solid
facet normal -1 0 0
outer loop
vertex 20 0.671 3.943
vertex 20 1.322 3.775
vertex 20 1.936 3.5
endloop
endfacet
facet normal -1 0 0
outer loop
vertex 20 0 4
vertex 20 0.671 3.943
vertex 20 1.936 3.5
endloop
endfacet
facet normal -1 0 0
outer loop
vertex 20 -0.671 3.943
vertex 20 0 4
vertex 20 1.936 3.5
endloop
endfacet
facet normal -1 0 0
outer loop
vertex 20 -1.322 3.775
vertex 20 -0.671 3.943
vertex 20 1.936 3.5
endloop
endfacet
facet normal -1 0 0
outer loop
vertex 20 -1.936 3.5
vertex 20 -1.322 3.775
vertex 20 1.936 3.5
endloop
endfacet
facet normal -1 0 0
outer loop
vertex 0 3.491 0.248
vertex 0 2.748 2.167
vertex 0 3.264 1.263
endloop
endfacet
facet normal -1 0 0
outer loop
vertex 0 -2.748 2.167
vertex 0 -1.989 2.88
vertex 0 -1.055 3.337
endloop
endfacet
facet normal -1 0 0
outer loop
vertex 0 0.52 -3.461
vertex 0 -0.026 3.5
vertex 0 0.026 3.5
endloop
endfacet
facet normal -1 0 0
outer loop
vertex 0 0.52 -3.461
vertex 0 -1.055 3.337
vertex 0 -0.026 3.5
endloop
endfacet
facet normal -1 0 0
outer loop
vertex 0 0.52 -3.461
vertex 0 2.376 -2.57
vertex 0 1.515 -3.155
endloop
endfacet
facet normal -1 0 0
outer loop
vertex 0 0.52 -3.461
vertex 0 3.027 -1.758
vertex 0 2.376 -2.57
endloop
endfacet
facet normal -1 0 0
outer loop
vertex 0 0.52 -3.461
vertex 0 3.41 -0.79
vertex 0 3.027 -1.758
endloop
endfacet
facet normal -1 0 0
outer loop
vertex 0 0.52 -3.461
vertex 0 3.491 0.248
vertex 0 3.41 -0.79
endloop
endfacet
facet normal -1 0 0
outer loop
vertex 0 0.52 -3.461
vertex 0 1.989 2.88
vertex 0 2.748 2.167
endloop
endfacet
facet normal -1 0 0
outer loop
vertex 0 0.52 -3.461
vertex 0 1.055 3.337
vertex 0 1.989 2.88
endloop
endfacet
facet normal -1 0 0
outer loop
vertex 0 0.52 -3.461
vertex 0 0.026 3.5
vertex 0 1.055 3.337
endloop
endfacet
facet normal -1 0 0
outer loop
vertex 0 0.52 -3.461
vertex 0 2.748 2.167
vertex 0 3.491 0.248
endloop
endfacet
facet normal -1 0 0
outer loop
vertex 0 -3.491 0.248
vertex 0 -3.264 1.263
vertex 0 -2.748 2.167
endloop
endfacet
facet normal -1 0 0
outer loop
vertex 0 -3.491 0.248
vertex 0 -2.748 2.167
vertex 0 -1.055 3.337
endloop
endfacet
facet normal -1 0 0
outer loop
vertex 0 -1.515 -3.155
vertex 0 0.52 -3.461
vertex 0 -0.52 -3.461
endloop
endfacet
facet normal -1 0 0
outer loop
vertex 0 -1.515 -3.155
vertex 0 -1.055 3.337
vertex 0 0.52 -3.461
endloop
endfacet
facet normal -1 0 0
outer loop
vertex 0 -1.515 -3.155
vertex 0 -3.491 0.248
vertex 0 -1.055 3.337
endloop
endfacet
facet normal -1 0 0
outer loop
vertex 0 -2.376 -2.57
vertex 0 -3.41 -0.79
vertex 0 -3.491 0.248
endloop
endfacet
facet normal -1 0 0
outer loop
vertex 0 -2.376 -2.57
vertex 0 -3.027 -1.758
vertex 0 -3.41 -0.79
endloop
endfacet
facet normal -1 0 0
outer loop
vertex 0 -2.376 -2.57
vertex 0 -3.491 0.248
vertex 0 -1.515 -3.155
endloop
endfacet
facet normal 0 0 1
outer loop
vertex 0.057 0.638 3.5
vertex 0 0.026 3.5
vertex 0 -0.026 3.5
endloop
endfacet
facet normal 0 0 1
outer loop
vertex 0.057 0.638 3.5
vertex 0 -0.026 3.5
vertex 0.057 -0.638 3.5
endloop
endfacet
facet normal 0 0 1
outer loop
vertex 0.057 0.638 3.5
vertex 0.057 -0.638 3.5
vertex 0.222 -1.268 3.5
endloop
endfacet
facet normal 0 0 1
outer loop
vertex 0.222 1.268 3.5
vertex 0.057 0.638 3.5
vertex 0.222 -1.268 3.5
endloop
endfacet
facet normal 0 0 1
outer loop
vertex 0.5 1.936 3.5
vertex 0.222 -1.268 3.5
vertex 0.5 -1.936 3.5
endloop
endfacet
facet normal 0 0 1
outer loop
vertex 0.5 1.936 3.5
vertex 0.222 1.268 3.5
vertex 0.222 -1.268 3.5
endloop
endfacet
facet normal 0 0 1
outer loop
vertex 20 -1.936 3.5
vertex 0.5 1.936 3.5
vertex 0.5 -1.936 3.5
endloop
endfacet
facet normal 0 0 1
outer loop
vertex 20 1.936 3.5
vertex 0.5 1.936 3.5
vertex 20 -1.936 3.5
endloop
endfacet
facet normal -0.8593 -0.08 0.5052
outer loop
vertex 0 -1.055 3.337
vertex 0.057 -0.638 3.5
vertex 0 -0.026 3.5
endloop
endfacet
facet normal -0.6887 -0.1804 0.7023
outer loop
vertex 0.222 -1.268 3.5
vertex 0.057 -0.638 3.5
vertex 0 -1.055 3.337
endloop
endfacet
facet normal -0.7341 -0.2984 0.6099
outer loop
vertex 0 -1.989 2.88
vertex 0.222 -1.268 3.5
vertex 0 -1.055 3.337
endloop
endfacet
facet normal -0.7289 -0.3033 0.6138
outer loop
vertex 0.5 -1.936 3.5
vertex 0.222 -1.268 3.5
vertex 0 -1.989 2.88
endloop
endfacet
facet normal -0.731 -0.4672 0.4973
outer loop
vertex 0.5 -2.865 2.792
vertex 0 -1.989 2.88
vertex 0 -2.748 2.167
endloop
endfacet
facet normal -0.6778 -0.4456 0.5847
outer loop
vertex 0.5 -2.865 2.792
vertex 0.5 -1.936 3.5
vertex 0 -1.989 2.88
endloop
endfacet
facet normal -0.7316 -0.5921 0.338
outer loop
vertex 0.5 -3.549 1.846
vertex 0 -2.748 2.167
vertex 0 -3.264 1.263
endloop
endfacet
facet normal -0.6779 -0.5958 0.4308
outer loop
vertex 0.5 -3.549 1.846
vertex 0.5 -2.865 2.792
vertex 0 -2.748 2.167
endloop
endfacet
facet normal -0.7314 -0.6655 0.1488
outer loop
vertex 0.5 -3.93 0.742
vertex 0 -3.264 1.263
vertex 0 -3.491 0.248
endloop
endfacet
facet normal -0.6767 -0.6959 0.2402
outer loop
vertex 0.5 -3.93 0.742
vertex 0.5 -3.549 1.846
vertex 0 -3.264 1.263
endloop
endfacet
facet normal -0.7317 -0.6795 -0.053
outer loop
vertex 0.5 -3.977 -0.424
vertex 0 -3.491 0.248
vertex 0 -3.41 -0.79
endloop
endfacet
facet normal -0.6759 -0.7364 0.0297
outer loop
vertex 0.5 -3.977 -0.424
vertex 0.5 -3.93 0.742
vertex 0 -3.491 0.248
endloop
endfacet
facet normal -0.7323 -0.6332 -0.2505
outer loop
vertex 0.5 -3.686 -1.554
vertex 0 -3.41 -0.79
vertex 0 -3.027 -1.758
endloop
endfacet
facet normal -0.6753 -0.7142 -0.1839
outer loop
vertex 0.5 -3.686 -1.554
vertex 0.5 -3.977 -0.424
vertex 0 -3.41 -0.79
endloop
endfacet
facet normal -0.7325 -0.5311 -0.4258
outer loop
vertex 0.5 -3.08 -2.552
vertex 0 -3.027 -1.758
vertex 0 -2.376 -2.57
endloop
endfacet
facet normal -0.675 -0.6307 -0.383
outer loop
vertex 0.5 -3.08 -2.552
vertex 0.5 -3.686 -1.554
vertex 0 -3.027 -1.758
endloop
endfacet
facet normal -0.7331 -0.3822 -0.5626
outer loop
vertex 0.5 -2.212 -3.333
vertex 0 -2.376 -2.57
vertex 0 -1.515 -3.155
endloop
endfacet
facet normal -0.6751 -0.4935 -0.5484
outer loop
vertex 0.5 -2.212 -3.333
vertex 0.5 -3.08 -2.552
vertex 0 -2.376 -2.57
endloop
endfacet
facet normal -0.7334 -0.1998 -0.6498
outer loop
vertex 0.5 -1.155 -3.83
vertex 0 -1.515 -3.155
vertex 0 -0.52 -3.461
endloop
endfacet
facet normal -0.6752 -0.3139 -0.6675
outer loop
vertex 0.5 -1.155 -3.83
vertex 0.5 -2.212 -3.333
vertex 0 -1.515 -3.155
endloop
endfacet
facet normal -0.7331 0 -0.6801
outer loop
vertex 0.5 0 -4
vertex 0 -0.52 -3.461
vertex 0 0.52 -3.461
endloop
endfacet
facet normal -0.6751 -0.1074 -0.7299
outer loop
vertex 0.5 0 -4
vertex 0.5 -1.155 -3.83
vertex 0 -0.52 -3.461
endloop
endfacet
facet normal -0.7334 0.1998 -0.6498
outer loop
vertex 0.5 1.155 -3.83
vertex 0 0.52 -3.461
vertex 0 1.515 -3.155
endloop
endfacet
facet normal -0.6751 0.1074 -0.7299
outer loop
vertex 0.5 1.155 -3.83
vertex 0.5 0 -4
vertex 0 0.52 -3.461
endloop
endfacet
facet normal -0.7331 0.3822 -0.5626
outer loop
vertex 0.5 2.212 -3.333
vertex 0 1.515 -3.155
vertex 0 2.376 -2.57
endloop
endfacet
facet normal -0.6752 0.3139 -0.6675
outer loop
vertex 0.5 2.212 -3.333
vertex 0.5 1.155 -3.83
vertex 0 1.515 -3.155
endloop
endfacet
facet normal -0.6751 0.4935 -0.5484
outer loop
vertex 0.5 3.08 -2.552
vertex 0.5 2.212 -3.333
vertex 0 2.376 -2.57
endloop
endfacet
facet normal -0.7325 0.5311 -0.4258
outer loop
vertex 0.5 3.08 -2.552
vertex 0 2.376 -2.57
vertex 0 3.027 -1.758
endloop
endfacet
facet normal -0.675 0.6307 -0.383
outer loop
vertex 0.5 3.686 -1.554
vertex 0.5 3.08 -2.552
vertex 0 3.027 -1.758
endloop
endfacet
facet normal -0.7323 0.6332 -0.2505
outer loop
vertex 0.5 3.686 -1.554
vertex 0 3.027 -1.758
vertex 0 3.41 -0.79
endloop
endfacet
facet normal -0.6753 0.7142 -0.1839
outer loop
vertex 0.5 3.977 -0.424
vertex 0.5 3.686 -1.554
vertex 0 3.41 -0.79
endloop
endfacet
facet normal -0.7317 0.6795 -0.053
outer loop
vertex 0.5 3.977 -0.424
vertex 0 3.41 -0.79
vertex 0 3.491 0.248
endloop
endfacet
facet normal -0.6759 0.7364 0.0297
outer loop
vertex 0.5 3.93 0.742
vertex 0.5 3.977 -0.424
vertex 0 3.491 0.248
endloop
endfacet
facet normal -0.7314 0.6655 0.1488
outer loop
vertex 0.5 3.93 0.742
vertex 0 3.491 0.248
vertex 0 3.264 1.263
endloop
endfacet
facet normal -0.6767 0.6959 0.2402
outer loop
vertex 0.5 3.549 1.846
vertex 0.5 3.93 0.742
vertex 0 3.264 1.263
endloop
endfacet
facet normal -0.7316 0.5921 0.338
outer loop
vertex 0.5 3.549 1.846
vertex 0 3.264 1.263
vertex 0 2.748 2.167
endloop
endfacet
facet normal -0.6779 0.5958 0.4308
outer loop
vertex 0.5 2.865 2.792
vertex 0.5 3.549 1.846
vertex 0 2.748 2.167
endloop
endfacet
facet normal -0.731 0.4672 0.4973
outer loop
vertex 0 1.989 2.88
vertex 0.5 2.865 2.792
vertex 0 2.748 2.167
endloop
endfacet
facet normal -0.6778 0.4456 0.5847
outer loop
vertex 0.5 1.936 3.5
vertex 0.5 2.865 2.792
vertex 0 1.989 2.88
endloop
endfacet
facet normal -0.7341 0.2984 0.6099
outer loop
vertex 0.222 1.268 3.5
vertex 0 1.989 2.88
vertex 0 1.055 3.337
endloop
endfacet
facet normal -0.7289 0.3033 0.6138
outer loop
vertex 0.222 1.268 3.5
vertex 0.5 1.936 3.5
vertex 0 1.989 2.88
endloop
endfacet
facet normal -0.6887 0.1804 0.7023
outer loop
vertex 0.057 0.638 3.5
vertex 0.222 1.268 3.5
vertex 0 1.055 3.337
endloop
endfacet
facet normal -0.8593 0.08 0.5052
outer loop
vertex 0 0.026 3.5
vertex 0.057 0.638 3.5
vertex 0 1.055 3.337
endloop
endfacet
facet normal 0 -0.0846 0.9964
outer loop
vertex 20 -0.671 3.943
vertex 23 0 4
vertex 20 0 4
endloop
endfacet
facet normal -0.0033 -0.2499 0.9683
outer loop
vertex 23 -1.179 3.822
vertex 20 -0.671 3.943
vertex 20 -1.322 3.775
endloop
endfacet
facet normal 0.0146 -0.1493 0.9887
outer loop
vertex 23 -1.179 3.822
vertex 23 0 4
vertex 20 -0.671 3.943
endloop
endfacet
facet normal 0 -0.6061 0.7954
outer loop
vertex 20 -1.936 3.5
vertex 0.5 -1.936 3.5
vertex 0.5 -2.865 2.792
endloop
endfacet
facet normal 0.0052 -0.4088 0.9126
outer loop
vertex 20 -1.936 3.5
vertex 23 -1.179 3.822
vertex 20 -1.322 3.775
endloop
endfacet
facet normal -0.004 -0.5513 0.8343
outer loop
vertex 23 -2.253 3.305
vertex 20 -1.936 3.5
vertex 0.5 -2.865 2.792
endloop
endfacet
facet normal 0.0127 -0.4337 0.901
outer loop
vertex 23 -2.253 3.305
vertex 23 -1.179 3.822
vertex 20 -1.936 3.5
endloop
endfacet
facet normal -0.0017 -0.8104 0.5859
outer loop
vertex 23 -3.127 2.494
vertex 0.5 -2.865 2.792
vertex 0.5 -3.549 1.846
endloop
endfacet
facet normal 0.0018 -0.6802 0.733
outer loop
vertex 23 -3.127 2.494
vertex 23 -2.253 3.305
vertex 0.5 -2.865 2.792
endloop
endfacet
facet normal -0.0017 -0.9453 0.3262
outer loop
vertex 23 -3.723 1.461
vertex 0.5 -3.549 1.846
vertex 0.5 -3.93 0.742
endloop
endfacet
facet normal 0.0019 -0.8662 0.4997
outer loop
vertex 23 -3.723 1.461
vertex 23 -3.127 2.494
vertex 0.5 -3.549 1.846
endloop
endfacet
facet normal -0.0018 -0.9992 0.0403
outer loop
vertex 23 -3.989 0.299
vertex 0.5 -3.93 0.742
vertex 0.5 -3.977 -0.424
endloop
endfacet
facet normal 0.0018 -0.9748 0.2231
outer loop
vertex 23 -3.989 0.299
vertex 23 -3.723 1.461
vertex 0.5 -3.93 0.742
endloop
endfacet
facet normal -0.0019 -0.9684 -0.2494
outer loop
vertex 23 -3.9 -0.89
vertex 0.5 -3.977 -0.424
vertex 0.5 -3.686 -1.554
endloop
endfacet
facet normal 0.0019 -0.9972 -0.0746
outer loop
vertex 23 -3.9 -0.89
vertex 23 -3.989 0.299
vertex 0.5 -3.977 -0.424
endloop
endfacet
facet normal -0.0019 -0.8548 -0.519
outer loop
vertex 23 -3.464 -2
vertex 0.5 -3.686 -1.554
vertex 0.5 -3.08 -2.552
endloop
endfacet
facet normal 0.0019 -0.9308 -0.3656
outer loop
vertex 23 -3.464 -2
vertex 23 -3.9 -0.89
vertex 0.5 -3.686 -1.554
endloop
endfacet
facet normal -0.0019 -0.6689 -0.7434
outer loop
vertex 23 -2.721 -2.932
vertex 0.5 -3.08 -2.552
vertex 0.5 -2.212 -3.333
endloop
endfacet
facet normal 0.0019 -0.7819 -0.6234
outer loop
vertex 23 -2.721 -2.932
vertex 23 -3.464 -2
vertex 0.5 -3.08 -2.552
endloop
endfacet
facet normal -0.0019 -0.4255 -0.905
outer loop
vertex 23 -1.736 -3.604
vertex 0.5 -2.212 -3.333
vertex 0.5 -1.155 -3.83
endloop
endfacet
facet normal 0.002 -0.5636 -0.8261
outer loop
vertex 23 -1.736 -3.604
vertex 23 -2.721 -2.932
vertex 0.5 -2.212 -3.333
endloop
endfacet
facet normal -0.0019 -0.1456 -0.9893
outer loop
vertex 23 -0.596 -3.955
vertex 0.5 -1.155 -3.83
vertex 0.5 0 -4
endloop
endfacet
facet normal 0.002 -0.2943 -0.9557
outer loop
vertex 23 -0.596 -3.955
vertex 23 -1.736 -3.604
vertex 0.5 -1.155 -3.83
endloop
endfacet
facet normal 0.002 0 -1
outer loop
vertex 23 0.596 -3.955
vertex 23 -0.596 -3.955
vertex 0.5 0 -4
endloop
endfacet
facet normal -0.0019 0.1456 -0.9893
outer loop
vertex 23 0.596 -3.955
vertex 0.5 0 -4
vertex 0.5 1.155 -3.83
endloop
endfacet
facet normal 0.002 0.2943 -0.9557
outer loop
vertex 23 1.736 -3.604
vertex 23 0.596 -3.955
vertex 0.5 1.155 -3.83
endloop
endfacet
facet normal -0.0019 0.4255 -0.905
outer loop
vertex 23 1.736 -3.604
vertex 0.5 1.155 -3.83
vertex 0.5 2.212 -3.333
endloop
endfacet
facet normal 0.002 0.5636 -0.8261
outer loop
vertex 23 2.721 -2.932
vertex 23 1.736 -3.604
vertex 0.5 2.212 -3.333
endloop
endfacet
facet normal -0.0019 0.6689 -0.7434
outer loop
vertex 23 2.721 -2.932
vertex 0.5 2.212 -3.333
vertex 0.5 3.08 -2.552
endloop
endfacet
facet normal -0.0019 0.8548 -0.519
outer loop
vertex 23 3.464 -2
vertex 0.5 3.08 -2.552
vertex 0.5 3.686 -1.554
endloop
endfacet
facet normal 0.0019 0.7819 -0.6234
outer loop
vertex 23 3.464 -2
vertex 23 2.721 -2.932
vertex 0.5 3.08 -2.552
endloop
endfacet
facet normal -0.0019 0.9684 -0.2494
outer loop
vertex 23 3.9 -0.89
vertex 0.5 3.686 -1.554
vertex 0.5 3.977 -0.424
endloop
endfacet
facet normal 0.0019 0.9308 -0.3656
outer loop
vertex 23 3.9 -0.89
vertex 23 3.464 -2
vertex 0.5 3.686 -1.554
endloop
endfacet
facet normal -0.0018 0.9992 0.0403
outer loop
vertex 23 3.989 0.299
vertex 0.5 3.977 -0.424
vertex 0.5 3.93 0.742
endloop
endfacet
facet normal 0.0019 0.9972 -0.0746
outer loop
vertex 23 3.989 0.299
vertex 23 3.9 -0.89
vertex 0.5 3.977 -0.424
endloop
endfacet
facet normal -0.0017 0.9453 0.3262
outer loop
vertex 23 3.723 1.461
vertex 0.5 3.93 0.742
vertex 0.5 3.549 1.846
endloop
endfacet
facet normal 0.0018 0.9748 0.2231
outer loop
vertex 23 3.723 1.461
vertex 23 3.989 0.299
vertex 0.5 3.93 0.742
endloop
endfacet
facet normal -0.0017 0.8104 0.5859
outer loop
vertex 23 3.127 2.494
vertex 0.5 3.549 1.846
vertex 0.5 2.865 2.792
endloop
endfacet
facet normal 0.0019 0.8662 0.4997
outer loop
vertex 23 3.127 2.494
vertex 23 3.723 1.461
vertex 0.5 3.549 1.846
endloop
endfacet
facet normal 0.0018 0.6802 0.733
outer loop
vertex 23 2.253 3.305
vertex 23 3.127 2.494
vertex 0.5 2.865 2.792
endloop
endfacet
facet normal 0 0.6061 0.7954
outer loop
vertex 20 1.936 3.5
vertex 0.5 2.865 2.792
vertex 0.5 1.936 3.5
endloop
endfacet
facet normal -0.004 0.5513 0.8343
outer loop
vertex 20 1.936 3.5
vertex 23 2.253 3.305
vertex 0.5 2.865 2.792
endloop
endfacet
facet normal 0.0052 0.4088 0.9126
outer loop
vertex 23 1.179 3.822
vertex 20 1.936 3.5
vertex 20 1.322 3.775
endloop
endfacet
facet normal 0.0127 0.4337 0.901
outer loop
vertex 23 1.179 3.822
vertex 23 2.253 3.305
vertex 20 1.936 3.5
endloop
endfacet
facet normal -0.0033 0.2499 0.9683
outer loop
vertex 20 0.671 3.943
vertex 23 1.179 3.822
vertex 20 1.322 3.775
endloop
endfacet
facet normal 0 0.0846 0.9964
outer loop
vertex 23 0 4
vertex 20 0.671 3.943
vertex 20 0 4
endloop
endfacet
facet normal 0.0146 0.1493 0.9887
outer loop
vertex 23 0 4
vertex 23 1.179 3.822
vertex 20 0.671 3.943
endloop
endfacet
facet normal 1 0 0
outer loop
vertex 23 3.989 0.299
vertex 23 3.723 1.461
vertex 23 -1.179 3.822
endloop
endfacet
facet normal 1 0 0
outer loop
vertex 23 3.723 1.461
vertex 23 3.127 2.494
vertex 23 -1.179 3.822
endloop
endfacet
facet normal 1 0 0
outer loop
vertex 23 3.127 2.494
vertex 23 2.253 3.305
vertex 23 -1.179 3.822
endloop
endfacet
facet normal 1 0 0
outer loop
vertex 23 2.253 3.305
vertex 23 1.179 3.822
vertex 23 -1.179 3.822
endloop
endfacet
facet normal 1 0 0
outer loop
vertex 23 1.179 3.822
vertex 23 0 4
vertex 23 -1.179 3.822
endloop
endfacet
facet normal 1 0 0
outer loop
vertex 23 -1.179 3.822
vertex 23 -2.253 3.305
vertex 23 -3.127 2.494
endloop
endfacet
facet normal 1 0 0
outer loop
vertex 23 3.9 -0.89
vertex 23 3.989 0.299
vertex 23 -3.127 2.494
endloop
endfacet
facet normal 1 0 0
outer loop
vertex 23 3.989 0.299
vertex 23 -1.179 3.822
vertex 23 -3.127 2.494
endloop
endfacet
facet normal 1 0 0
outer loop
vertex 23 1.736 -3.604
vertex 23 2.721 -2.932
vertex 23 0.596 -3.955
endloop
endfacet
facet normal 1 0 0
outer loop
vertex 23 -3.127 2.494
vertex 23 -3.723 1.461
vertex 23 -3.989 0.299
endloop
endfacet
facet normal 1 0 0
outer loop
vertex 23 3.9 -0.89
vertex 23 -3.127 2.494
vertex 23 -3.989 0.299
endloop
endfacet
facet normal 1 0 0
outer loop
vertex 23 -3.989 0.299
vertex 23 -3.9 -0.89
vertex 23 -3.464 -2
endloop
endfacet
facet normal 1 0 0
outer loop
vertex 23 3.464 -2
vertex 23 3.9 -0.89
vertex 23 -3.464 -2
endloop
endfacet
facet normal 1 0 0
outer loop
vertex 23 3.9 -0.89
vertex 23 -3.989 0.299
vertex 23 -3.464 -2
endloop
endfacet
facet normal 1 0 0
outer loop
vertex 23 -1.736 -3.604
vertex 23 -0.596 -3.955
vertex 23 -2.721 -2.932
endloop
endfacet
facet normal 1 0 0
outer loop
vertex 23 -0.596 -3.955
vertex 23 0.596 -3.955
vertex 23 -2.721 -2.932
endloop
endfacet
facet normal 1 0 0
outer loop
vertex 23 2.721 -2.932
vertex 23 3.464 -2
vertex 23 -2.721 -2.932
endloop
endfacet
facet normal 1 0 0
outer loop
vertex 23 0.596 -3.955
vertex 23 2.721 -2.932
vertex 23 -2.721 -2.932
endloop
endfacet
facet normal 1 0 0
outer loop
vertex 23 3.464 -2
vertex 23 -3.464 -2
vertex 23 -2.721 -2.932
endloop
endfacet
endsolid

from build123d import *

# Parameters (mm, degrees)
ESQUISSE1_W             = 23
ESQUISSE1_H             = 4
ESQUISSE2_W             = 20
ESQUISSE2_H             = 10
ENL_V_MAT_EXTRU_1_DEPTH = 0.5
CHANFREIN1_SIZE         = 0.5


with BuildPart() as part:
    # Esquisse1 → Révolution1 (revolve)
    with BuildSketch(Plane.XY, mode=Mode.PRIVATE) as r_volution1_sk:
        with Locations((11.5, 2)):
            Rectangle(ESQUISSE1_W, ESQUISSE1_H)
    revolve(r_volution1_sk.sketch.rotate(Axis((-20.595505618, 0, 0), (1, 0, 0)), 90), axis=Axis((-20.595505618, 0, 0), (1, 0, 0)))

    # Esquisse2 → Enlèv. mat.-Extru.1 (cut)
    with BuildSketch(Plane.XY.offset(4)):
        with Locations((10, 0)):
            Rectangle(ESQUISSE2_W, ESQUISSE2_H)
    extrude(amount=-ENL_V_MAT_EXTRU_1_DEPTH, mode=Mode.SUBTRACT)

    # Chanfrein1
    chanfrein1_edges = [part.edges().sort_by_distance(p)[0] for p in [
        (0, 0, -4),
    ]]
    chamfer(chanfrein1_edges, length=CHANFREIN1_SIZE - 0.0001)  # a hair under: the kernel refuses the full size


solid = part.part
